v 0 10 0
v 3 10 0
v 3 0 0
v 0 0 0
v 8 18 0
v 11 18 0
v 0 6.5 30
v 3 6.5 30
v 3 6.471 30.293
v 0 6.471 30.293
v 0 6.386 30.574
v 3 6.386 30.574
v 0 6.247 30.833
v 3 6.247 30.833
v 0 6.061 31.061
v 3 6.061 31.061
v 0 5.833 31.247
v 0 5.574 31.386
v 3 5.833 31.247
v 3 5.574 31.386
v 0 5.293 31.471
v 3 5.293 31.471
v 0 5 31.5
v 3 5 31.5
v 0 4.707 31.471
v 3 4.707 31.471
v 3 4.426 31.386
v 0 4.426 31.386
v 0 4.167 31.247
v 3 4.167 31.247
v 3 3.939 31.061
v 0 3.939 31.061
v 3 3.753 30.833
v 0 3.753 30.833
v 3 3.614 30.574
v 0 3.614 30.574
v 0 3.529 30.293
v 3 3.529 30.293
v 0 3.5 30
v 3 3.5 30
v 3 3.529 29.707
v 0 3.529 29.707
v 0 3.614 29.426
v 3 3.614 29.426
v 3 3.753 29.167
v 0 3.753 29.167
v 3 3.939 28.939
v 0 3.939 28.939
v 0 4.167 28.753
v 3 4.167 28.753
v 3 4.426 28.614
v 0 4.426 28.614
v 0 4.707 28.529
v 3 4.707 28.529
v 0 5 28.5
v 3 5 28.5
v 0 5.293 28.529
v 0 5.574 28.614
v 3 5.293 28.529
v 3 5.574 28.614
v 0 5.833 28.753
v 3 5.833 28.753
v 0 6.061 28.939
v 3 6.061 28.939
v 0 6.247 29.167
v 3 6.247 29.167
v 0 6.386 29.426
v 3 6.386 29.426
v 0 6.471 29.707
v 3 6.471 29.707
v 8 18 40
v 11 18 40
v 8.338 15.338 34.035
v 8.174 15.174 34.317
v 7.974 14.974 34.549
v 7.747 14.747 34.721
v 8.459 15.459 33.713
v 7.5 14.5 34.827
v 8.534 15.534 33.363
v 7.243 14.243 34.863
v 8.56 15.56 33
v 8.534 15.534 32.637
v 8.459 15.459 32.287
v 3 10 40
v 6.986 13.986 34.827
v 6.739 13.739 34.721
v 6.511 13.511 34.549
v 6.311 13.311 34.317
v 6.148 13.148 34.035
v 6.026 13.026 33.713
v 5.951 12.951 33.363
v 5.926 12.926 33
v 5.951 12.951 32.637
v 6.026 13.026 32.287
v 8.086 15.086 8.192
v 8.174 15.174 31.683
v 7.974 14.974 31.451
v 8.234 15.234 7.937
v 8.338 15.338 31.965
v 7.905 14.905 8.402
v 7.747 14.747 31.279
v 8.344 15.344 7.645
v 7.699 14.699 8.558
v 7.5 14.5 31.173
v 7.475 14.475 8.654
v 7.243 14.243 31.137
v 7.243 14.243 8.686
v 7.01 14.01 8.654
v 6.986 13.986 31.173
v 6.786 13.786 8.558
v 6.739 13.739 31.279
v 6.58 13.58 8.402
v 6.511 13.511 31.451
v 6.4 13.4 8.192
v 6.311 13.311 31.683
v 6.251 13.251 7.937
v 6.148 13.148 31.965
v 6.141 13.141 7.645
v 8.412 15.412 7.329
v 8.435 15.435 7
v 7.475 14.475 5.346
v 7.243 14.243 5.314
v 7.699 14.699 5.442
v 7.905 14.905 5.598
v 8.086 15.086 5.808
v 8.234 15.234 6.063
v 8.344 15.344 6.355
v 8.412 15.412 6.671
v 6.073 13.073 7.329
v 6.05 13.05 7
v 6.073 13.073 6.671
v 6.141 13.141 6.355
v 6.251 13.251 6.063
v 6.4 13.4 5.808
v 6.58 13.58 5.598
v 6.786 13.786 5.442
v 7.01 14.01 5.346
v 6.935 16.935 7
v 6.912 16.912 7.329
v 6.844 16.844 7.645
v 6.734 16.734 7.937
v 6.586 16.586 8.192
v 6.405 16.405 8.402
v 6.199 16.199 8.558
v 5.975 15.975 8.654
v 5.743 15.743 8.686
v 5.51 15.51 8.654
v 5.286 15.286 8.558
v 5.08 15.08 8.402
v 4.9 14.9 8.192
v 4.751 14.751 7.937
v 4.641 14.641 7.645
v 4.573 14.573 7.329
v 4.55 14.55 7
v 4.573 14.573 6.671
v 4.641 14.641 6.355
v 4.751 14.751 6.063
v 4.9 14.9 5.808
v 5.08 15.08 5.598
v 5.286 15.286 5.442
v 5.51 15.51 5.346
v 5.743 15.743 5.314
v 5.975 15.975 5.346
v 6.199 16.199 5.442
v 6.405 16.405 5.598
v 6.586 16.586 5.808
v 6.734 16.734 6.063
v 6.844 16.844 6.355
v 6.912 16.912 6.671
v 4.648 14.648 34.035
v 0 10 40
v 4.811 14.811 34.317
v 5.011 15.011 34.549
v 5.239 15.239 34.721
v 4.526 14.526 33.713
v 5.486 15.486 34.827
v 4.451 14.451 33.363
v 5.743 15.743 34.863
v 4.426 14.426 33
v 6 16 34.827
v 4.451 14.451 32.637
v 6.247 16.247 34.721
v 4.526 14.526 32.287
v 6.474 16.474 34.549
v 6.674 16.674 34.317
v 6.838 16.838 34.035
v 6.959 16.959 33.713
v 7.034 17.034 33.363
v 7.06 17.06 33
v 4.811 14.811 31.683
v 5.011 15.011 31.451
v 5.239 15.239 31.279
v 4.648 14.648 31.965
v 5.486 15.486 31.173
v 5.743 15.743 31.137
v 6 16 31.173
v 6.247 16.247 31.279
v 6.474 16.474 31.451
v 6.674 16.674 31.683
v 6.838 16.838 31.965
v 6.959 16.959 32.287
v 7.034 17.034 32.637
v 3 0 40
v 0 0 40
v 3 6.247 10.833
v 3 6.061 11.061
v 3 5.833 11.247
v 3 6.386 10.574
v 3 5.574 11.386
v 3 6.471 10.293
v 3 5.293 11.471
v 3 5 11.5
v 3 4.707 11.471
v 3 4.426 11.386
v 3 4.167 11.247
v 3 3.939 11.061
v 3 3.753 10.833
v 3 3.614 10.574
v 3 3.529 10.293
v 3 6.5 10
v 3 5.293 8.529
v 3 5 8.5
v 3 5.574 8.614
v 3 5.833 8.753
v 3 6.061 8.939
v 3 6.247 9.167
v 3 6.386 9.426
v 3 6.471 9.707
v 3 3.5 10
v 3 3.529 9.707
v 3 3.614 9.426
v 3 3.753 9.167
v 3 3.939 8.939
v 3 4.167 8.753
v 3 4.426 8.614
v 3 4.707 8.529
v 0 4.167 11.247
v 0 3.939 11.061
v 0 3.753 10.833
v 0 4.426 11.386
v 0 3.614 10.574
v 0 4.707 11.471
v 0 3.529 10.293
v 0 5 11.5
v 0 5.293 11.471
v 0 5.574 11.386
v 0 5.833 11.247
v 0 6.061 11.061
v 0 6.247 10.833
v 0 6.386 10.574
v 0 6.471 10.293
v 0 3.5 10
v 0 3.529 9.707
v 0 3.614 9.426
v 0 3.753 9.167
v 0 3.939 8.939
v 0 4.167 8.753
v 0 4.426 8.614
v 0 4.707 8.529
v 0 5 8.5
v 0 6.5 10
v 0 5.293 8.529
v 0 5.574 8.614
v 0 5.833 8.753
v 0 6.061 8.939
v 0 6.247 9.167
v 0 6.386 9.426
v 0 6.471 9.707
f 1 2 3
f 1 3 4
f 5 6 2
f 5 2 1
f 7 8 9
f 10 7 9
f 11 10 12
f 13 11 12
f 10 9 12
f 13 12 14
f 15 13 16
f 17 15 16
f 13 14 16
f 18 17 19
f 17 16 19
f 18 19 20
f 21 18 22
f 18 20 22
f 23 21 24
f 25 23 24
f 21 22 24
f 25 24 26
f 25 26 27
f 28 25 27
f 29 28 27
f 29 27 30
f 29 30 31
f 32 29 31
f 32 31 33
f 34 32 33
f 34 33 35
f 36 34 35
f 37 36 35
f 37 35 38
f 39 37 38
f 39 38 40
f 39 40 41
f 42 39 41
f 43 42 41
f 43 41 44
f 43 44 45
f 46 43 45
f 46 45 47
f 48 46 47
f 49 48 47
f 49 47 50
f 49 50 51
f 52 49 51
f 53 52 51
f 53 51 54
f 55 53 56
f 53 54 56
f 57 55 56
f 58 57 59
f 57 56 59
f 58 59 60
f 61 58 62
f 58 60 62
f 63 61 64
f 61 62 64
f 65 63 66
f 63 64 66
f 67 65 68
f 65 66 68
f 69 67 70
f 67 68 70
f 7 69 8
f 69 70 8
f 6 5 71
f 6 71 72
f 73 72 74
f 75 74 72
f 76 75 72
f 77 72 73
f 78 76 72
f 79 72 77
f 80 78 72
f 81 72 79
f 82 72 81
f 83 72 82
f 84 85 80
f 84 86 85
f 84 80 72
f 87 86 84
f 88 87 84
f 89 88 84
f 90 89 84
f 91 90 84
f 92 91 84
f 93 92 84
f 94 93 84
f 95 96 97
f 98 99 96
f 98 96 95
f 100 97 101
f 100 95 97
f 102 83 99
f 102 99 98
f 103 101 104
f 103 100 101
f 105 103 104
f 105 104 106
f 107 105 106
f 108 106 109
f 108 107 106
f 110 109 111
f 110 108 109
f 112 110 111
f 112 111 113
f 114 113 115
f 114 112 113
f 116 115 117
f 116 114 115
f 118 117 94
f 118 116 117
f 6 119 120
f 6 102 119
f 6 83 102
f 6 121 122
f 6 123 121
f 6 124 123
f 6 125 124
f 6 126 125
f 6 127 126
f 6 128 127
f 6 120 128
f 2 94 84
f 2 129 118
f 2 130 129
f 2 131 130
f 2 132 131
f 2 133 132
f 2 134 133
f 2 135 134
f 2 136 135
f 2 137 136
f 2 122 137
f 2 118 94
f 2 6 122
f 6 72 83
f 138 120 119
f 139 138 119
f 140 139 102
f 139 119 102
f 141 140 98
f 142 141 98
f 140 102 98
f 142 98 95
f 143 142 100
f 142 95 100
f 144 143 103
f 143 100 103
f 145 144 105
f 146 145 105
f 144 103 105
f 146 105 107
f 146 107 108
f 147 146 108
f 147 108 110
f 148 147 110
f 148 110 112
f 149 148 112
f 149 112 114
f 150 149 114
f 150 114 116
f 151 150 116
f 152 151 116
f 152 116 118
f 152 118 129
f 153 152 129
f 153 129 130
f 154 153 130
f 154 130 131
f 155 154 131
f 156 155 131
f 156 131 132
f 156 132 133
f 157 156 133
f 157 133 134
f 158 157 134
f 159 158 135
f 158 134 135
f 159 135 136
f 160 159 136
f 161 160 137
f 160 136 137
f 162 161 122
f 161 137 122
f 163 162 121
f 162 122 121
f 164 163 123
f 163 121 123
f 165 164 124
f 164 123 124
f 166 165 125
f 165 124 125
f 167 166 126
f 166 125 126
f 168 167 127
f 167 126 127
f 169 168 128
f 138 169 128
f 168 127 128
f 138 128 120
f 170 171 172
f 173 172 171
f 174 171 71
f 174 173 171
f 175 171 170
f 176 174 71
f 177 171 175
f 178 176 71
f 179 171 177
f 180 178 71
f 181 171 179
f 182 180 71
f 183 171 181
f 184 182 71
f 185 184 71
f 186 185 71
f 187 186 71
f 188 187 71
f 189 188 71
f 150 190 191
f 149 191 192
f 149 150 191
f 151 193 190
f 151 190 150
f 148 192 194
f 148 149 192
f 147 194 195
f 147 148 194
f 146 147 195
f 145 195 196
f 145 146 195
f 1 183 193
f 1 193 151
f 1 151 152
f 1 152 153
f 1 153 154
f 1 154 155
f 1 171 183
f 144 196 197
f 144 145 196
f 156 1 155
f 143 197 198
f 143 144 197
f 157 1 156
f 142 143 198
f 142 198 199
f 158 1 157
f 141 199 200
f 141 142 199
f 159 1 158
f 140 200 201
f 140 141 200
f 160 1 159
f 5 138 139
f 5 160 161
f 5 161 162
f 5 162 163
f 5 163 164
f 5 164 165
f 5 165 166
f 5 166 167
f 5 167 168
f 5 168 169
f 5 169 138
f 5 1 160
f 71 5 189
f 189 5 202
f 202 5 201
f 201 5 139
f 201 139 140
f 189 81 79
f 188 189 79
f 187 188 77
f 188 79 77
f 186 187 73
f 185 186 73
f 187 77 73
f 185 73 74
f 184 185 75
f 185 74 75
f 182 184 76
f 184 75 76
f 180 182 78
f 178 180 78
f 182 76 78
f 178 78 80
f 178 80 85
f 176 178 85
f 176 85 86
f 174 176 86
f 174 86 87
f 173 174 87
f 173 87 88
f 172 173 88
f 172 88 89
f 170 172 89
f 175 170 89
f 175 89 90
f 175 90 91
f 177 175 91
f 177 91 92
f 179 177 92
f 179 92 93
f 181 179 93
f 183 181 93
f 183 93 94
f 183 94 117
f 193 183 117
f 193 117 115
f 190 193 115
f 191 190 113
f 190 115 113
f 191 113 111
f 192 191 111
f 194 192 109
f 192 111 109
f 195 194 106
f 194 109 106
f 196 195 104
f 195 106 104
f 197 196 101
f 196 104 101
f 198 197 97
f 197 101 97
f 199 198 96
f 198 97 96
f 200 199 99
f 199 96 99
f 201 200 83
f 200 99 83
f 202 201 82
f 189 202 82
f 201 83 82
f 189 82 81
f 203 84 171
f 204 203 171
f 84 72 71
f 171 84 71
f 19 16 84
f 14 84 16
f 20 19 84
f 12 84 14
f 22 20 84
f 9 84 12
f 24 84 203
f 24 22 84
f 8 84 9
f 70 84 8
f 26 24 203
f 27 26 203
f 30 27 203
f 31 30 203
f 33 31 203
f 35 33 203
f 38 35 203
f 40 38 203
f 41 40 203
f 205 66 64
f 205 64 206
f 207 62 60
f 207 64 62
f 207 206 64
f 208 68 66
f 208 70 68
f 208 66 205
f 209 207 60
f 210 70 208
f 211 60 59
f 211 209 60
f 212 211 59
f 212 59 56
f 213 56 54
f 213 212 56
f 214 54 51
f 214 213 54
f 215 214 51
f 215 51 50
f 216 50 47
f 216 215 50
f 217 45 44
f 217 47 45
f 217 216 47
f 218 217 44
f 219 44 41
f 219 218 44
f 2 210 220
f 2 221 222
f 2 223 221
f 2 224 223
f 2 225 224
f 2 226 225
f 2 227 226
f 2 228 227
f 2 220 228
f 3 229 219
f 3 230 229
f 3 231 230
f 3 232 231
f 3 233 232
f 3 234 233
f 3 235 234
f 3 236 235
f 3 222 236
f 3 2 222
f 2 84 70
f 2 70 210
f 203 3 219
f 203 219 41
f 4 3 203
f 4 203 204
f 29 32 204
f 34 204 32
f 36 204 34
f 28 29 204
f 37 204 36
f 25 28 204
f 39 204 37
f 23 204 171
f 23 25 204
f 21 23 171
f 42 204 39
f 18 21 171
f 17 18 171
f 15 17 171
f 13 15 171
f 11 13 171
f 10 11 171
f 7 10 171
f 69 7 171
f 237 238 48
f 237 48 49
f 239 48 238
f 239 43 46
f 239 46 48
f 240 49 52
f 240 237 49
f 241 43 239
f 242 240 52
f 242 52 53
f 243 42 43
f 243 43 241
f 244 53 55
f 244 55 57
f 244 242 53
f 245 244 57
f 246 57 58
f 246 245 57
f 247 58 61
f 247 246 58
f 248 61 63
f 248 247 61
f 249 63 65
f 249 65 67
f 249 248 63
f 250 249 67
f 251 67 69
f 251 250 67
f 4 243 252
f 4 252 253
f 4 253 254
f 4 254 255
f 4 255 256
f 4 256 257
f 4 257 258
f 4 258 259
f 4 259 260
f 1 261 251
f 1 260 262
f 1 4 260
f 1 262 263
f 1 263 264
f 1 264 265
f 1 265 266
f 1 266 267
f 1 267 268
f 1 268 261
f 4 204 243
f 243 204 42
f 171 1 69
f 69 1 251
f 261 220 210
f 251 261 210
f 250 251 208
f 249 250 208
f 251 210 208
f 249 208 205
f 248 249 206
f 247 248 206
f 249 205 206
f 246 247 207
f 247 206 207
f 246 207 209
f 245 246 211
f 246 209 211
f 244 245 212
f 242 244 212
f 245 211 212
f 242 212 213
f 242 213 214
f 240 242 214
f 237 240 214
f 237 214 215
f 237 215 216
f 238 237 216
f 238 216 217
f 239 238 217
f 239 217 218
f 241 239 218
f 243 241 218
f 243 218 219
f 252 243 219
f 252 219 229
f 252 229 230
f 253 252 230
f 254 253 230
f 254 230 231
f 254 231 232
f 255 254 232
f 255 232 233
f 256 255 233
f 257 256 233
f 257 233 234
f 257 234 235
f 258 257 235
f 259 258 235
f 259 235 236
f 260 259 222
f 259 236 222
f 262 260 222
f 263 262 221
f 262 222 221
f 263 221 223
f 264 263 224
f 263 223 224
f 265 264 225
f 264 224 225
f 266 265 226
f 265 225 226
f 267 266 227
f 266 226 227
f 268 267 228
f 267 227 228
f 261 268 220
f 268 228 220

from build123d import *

# Parameters (mm, degrees)
EXTRUDE_2_DEPTH     = 40
SKETCH_3_R          = 1.5
CUT_EXTRUDE_1_DEPTH = 10
SKETCH_4_R          = 1.686195938
SKETCH_4_R_2        = 1.862668349
CUT_EXTRUDE_2_DEPTH = 10


with BuildPart() as part:
    # 草图2 → 凸台-拉伸2 (new body)
    with BuildSketch(Plane.XY):
        Polygon((0, 0), (0, 10), (8, 18), (11, 18), (3, 10), (3, 0), align=None)
    extrude(amount=EXTRUDE_2_DEPTH)

    # 草图3 → 切除-拉伸1 (cut)
    with BuildSketch(Plane(origin=(3, 0, 0), x_dir=(0, 0, -1), z_dir=(1, 0, 0))):
        with Locations(Location((-10, 5, 0), (0, 0, 90))):
            Circle(SKETCH_3_R)
        with Locations(Location((-30, 5, 0), (0, 0, 90))):
            Circle(SKETCH_3_R)
    extrude(amount=-CUT_EXTRUDE_1_DEPTH, mode=Mode.SUBTRACT)

    # 草图4 → 切除-拉伸2 (cut)
    with BuildSketch(Plane(origin=(-3.5, 3.5, 0), x_dir=(0, 0, -1), z_dir=(0.7071067811865515, -0.7071067811865437, 0))):
        with Locations(Location((-7, 15.192388155, 0), (0, 0, 90))):
            Circle(SKETCH_4_R)
        with Locations(Location((-33, 15.192388155, 0), (0, 0, 90))):
            Circle(SKETCH_4_R_2)
    extrude(amount=-CUT_EXTRUDE_2_DEPTH, mode=Mode.SUBTRACT)


solid = part.part
